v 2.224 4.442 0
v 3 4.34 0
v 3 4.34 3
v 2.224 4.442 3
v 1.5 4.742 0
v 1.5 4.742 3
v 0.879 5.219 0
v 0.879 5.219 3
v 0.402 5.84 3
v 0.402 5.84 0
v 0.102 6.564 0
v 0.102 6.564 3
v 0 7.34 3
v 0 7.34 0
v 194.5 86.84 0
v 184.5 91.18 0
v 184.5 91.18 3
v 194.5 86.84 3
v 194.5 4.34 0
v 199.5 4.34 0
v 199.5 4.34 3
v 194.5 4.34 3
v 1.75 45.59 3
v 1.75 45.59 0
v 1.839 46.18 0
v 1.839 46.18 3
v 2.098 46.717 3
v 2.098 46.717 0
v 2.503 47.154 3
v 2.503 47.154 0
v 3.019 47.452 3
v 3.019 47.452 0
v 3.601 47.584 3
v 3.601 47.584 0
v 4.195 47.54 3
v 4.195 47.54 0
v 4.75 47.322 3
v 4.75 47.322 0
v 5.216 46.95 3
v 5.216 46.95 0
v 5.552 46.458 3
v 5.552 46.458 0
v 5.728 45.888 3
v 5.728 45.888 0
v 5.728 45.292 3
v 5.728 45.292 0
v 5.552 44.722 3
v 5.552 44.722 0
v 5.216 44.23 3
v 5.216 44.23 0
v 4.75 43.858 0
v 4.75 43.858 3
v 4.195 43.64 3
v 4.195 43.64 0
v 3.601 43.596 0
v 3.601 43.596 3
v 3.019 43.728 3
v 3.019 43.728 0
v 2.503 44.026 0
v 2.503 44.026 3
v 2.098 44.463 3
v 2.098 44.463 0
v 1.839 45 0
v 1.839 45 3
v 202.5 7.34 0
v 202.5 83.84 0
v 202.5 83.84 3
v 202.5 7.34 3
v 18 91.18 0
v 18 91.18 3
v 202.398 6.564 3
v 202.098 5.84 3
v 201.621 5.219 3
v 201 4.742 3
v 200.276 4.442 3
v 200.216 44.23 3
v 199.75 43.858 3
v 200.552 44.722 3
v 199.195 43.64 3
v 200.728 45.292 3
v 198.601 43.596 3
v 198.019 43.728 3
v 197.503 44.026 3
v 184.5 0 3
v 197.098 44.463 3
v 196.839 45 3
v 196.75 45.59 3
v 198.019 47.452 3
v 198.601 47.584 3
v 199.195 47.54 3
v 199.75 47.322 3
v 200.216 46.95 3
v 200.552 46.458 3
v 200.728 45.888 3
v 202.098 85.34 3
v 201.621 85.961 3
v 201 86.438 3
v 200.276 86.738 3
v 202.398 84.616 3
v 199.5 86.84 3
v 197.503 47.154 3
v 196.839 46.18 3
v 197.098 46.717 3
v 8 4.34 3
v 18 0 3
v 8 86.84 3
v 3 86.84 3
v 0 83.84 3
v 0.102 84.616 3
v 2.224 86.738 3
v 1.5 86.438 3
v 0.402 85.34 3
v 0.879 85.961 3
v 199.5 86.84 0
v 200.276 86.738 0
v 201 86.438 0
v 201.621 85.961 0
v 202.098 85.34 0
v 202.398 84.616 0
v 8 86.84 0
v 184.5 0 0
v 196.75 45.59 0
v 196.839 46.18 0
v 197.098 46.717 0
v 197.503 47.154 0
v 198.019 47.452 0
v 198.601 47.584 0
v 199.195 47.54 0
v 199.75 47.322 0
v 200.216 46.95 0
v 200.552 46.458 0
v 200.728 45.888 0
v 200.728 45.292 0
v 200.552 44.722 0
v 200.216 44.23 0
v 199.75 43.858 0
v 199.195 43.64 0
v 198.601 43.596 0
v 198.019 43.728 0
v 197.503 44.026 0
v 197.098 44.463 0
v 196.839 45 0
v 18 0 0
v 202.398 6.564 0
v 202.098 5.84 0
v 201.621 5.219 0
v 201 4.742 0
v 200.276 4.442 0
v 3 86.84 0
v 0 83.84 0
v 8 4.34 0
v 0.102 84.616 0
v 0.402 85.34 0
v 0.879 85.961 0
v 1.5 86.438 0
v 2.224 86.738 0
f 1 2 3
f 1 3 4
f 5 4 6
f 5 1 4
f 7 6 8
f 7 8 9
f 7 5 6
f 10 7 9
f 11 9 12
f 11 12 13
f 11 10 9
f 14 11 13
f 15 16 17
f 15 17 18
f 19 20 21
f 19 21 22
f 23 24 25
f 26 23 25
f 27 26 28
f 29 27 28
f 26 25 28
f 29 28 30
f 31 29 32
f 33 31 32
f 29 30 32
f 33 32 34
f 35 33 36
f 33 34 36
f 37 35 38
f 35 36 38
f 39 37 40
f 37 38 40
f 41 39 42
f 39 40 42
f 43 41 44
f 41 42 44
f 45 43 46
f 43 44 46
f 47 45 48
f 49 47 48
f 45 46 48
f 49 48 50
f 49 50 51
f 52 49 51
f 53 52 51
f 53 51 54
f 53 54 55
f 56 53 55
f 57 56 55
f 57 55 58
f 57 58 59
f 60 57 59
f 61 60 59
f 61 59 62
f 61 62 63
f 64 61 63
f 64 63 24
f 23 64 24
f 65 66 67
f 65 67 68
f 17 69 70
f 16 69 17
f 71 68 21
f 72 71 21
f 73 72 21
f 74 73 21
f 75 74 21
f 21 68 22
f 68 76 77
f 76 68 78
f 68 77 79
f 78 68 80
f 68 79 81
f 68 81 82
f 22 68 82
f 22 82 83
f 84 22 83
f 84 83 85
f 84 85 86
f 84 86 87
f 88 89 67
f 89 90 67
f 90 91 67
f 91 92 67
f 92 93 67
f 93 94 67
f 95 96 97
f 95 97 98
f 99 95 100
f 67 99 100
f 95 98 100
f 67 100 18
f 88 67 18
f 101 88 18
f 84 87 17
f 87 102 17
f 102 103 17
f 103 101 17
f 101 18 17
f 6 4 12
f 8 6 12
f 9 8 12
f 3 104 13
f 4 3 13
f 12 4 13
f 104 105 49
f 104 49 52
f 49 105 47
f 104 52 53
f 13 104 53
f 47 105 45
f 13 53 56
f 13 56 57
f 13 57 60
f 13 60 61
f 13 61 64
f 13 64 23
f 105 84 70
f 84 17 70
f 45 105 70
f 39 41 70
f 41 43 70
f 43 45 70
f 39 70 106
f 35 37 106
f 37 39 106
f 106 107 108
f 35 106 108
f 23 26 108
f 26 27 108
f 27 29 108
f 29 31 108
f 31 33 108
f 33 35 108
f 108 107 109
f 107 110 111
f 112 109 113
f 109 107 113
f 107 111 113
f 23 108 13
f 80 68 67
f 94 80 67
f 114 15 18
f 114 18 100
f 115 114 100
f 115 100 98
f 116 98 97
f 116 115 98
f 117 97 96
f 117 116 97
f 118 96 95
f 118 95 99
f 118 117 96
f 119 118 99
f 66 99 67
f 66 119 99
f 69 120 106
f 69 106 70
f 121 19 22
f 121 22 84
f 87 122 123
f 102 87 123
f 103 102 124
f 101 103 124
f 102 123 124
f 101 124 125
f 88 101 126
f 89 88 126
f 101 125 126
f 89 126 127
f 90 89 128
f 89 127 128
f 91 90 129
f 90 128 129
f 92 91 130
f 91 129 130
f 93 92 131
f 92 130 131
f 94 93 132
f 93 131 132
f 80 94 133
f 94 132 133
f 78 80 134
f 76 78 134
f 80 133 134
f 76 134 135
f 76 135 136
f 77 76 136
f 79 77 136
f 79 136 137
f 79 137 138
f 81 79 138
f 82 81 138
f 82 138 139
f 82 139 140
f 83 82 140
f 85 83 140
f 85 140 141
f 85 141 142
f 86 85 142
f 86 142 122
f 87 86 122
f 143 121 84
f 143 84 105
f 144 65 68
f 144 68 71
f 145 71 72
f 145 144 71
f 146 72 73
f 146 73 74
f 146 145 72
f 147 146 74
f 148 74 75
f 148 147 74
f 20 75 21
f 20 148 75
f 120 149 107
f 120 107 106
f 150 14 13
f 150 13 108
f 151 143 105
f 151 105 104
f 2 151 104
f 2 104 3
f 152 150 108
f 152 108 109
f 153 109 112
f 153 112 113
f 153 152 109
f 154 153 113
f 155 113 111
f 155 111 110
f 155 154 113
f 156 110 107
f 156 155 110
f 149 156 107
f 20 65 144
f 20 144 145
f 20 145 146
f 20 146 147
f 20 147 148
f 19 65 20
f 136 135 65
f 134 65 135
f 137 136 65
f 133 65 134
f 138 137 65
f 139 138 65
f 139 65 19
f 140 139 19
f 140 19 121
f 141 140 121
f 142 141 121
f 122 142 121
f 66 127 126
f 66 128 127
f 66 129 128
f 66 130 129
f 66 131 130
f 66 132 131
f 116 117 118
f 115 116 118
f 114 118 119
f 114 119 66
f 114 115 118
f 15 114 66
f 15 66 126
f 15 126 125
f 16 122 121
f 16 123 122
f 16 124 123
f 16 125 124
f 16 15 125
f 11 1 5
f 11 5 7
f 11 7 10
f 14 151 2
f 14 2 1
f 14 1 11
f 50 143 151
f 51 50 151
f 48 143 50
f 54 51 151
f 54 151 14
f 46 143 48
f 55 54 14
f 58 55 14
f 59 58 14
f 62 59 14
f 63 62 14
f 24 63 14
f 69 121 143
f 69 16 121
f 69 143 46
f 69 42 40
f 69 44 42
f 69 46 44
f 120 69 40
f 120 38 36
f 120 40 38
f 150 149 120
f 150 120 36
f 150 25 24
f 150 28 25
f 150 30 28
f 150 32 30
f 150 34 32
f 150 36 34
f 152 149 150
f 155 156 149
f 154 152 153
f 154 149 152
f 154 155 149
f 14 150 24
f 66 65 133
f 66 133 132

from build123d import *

# Parameters (mm, degrees)
BOSS_EXTRUDE1_DEPTH   = 3
F_4_0MM_DOWEL_HOLE1_D = 4


with BuildPart() as part:
    # Sketch1 → Boss-Extrude1 (new body)
    with BuildSketch(Plane.XY):
        with BuildLine():
            Line((0, 7.34), (0, 83.84))
            ThreePointArc((0, 83.84), (0.878679656, 85.961320344), (3, 86.84))
            Line((3, 86.84), (8, 86.84))
            Line((8, 86.84), (18, 91.18))
            Line((18, 91.18), (184.5, 91.18))
            Line((184.5, 91.18), (194.5, 86.84))
            Line((194.5, 86.84), (199.5, 86.84))
            ThreePointArc((199.5, 86.84), (201.621320344, 85.961320344), (202.5, 83.84))
            Line((202.5, 83.84), (202.5, 7.34))
            ThreePointArc((202.5, 7.34), (201.621320344, 5.218679656), (199.5, 4.34))
            Line((199.5, 4.34), (194.5, 4.34))
            Line((194.5, 4.34), (184.5, 0))
            Line((184.5, 0), (18, 0))
            Line((18, 0), (8, 4.34))
            Line((8, 4.34), (3, 4.34))
            ThreePointArc((3, 4.34), (0.878679656, 5.218679656), (0, 7.34))
        make_face()
    extrude(amount=BOSS_EXTRUDE1_DEPTH)

    # Ø4.0mm Dowel Hole1 (through all)
    with Locations(Plane.XY.offset(3)):
        with Locations((3.75, 45.59), (198.75, 45.59)):
            Hole(F_4_0MM_DOWEL_HOLE1_D / 2)


solid = part.part
